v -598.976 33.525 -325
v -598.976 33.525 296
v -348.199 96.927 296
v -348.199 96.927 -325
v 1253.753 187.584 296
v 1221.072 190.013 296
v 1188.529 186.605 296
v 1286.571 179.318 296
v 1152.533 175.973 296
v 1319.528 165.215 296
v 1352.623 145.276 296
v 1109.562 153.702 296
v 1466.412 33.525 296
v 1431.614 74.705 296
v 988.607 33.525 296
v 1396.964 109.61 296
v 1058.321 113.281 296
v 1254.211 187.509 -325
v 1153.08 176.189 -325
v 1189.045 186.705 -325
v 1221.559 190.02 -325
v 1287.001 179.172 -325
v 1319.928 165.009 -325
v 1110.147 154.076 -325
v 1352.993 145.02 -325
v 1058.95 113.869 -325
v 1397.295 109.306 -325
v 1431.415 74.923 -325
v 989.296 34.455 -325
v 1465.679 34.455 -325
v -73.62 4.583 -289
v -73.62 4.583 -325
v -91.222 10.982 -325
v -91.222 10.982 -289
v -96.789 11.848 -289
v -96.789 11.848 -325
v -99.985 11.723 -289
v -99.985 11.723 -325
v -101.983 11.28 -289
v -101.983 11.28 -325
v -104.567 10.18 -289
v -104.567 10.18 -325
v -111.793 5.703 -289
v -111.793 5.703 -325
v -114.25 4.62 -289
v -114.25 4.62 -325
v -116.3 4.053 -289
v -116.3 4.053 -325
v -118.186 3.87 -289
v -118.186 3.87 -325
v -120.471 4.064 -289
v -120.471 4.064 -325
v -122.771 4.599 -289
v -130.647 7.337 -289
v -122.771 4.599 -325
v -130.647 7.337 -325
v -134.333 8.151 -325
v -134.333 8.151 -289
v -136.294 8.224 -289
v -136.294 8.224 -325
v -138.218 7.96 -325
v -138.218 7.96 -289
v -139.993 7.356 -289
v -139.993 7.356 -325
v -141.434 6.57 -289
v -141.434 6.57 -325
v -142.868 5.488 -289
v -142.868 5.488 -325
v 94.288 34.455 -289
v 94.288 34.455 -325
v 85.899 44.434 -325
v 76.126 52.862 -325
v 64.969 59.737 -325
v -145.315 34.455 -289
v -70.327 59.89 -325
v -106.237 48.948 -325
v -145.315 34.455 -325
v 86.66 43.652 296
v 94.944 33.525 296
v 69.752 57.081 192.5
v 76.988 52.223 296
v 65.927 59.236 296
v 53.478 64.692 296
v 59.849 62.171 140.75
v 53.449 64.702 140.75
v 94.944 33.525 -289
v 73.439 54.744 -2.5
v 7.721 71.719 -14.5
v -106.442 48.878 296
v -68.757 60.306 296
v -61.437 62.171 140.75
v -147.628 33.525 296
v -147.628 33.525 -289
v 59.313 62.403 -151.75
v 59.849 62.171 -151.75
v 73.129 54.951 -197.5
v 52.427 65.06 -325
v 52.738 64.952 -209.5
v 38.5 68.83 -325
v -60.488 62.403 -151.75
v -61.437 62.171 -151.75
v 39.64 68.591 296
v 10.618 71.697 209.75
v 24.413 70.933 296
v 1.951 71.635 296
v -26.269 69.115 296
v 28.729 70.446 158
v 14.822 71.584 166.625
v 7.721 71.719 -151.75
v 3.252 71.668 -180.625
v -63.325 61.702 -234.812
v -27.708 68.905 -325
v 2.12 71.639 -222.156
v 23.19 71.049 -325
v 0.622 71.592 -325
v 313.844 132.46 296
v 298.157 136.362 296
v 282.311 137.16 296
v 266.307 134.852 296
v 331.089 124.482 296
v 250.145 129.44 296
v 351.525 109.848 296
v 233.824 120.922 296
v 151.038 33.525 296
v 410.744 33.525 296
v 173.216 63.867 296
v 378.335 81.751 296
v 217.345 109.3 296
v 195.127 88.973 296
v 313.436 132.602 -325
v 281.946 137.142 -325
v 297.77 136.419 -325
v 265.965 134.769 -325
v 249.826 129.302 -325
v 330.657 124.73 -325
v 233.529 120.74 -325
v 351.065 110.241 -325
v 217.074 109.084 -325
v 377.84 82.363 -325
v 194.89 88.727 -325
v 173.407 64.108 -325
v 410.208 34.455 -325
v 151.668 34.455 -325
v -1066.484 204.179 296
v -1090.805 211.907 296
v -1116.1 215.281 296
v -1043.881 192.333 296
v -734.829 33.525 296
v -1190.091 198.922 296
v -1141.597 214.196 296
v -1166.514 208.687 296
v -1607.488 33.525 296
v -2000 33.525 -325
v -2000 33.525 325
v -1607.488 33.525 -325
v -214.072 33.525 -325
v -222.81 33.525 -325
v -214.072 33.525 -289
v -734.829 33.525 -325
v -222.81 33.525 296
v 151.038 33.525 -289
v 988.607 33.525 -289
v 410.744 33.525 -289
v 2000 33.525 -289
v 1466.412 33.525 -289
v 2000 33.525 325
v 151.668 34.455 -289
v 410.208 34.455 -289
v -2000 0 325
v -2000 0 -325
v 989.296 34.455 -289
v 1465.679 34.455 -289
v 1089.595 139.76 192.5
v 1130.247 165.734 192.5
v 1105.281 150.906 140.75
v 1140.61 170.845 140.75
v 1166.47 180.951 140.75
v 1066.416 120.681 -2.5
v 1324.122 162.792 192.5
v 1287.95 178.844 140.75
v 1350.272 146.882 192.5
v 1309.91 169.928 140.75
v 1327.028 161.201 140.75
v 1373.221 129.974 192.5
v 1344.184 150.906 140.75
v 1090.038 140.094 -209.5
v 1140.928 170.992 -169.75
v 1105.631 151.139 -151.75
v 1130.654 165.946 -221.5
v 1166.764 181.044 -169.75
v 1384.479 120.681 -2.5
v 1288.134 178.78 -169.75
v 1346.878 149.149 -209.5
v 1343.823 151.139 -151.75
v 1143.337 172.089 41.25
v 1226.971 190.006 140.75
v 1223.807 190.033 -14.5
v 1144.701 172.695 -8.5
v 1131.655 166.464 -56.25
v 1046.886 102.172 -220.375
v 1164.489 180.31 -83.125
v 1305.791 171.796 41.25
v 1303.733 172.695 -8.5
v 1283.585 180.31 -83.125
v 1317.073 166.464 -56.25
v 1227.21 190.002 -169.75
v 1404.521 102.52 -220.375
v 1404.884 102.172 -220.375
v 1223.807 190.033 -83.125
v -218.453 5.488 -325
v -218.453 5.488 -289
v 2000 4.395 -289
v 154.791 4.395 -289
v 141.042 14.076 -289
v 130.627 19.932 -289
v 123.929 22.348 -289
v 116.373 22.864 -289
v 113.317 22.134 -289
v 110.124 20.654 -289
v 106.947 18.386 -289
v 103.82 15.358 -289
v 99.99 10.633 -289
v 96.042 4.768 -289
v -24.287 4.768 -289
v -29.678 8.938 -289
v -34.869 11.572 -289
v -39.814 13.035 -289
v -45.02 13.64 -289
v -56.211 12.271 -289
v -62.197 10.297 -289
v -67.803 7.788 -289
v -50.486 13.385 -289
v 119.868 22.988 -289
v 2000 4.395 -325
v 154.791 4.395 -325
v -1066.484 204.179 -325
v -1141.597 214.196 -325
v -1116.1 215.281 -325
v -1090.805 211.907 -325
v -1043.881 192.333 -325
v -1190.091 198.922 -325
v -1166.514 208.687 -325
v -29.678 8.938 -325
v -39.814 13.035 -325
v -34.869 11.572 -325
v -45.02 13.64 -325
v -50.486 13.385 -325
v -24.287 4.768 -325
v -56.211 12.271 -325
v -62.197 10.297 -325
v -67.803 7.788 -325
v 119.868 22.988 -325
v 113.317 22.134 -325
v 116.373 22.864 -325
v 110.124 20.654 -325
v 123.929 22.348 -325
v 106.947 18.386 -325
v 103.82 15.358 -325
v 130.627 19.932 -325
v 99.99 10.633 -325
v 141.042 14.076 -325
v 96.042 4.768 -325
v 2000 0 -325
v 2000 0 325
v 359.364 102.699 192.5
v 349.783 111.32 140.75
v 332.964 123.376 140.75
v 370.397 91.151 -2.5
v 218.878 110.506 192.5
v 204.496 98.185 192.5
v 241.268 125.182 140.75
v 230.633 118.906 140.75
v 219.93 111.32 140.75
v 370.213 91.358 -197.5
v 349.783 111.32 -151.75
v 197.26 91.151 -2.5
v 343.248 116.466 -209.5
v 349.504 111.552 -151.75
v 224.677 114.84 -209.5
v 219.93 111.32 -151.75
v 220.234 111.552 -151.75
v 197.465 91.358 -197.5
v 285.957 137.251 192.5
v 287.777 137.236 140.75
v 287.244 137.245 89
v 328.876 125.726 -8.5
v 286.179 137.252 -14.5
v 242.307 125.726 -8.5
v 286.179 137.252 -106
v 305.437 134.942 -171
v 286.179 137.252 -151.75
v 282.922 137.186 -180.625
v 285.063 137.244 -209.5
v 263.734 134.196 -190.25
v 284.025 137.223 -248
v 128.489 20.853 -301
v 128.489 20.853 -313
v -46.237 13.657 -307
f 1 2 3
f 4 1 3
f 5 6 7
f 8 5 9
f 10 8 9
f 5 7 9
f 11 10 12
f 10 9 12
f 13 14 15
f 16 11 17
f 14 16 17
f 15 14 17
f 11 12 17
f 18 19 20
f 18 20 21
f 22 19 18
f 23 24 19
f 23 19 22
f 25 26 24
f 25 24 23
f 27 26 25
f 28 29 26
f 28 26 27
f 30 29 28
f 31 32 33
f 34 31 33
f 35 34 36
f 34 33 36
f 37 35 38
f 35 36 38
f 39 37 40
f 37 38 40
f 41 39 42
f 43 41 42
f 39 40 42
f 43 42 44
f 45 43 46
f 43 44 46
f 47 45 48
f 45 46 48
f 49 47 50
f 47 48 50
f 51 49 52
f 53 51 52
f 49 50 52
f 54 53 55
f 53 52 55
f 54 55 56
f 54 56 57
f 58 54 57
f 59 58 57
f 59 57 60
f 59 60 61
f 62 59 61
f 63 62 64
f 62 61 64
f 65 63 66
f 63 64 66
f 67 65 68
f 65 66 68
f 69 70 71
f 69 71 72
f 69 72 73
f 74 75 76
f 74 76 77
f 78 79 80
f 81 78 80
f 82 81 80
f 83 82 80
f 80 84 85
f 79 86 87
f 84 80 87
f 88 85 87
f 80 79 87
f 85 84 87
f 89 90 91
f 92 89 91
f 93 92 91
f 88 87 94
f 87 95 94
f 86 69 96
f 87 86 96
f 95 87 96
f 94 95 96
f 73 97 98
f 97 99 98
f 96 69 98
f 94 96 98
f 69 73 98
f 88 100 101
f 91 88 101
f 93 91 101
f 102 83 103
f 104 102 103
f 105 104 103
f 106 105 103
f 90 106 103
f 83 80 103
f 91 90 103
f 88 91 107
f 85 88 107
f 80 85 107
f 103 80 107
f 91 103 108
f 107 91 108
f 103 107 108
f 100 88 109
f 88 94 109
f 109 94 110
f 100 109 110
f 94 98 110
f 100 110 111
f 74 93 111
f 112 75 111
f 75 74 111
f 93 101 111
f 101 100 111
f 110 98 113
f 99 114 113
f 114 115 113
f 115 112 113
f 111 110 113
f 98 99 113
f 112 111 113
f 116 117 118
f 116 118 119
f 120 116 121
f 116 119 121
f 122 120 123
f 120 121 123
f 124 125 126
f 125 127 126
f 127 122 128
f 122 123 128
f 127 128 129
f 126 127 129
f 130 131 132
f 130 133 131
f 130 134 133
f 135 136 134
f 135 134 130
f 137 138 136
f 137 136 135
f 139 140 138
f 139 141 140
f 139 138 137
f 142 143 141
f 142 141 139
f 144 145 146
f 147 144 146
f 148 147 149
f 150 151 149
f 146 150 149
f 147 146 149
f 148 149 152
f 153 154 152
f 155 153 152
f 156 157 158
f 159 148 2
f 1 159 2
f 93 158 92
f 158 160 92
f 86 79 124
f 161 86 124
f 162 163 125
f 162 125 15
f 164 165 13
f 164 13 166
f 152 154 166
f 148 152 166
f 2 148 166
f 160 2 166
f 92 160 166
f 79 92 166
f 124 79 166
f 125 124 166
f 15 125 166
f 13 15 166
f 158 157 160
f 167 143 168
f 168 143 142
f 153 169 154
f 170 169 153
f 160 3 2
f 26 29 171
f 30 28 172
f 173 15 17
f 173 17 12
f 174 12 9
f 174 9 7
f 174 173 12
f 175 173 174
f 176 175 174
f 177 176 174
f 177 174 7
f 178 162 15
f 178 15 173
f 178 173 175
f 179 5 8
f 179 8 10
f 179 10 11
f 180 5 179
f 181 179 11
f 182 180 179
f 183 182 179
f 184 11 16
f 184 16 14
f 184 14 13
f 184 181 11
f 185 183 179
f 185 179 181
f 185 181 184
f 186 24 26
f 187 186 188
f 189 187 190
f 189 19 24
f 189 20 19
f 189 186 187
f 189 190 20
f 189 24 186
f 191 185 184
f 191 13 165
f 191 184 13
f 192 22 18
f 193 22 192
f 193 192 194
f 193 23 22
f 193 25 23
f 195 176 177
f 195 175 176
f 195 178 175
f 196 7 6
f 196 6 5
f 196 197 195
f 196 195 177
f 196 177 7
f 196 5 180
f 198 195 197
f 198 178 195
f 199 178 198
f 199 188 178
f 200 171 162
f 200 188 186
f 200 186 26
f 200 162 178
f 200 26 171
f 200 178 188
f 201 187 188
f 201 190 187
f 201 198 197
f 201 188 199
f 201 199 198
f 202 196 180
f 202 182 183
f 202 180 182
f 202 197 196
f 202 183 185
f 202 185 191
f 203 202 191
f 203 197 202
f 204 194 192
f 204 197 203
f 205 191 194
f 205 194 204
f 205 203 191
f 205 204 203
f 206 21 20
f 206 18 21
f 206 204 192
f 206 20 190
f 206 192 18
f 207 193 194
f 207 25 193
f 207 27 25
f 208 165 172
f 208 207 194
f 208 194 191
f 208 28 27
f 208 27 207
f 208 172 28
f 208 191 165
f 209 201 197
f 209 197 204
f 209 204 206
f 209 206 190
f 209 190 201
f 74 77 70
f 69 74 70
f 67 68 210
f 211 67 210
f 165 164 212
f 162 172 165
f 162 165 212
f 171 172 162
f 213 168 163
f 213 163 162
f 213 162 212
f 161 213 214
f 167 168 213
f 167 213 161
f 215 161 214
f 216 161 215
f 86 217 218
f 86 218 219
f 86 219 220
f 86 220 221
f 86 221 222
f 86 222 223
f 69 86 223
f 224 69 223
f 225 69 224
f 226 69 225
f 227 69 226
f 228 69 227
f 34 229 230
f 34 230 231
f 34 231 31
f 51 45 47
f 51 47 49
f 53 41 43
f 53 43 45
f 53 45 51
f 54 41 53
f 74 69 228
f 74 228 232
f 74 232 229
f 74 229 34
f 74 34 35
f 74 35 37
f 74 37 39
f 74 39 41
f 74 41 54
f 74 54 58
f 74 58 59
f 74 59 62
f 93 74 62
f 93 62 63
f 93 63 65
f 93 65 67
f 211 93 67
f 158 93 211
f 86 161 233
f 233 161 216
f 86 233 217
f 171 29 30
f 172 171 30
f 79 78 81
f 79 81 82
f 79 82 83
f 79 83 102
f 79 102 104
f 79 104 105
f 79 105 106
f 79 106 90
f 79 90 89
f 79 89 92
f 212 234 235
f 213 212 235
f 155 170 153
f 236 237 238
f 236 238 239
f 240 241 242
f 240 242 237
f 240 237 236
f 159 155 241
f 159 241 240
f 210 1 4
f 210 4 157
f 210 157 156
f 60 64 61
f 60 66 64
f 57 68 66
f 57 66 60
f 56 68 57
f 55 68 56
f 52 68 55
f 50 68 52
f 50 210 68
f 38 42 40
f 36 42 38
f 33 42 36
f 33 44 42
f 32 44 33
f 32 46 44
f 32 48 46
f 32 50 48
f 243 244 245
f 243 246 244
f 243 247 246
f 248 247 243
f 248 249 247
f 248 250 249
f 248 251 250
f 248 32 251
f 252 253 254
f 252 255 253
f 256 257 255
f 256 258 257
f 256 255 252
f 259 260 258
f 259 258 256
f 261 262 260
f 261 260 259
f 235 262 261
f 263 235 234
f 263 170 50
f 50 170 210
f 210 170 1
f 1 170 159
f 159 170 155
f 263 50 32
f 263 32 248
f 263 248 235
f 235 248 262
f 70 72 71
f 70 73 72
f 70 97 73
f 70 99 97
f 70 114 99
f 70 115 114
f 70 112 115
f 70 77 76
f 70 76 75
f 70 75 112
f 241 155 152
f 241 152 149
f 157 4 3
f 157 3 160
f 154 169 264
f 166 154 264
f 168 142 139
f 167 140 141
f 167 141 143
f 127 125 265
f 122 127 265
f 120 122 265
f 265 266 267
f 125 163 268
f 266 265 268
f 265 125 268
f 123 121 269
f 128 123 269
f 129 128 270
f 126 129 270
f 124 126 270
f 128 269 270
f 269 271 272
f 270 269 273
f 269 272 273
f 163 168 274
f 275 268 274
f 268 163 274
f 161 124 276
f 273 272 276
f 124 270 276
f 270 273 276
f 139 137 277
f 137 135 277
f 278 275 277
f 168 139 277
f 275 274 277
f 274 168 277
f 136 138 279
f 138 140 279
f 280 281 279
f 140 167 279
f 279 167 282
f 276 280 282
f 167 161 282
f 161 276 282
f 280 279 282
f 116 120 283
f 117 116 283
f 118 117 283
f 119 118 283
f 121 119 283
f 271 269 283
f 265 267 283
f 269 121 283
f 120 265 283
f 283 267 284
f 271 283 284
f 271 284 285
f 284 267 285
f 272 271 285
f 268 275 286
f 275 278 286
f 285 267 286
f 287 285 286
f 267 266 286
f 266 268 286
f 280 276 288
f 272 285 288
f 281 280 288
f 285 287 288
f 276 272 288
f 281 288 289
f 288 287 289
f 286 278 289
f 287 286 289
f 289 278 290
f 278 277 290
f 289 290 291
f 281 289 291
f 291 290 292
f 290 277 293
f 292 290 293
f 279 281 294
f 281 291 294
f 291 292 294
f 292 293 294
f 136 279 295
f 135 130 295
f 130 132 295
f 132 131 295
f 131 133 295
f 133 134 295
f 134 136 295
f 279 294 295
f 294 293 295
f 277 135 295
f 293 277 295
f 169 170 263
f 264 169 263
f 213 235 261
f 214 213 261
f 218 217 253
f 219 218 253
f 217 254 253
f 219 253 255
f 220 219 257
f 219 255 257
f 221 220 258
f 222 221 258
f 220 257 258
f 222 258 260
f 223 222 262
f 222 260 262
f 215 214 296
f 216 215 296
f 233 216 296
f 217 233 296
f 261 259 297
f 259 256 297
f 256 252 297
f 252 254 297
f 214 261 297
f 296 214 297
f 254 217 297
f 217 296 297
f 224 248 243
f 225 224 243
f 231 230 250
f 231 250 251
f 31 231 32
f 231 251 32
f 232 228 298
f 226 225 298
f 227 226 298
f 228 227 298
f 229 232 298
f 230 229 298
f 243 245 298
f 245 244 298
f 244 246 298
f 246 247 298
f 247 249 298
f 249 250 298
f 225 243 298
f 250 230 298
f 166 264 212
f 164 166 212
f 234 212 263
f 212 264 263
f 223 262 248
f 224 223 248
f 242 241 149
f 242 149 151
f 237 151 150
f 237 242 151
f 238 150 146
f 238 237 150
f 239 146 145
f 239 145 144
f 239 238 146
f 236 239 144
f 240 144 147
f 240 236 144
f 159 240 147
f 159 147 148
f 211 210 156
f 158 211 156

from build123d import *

# Parameters (mm, degrees)
SKETCH1_W           = 4000
SKETCH1_H           = 650
BOSS_EXTRUDE1_DEPTH = 300
CUT_EXTRUDE3_DEPTH  = 333
CUT_EXTRUDE4_DEPTH  = 333
SKETCH7_W           = 4176.612748617
SKETCH7_H           = 878.539936904
CUT_EXTRUDE5_DEPTH  = 1765
BOSS_EXTRUDE2_DEPTH = 621
CUT_EXTRUDE2_DEPTH  = 36
SKETCH9_W           = 176.354899095
SKETCH9_H           = 70.962636727
CUT_EXTRUDE6_DEPTH  = 1243


with BuildPart() as part:
    # Sketch1 → Boss-Extrude1 (new body)
    with BuildSketch(Plane(origin=(0, 0, 0), x_dir=(1, 0, 0), z_dir=(0, 1, 0))):
        Rectangle(SKETCH1_W, SKETCH1_H)
    extrude(amount=BOSS_EXTRUDE1_DEPTH)

    # Sketch4 → Cut-Extrude3 (cut)
    with BuildSketch(Plane.XY.offset(325)):
        with BuildLine():
            Line((-2000, 42), (-1023.920441049, 42))
            add(Edge.make_bspline(
                [(-1023.920441049, 42), (-625.596073389, 421.290119466), (-564.500559645, 42), (-394.069004627, 42)],
                knots=[0, 0, 0, 0, 1, 1, 1, 1], degree=3))
            Line((-394.069004627, 42), (77.281429251, 42))
            add(Edge.make_bspline(
                [(77.281429251, 42), (384.820845821, 379.875880114), (804.142903292, 42.162527318)],
                knots=[0, 0, 0, 1, 1, 1], degree=2))
            add(Edge.make_bspline(
                [(804.142903292, 42.162527318), (1120.560926985, 359.520052232), (1155.923131209, 42), (1331.813245168, 42)],
                knots=[0, 0, 0, 0, 1, 1, 1, 1], degree=3))
            Line((1331.813245168, 42), (2000, 42))
            Line((2000, 42), (2000, 300))
            Line((2000, 300), (-2000, 300))
            Line((-2000, 300), (-2000, 42))
        make_face()
    extrude(amount=-CUT_EXTRUDE3_DEPTH, mode=Mode.SUBTRACT)

    # Sketch6 → Cut-Extrude4 (cut)
    with BuildSketch(Plane(origin=(0, 0, -325), x_dir=(-1, 0, 0), z_dir=(0, 0, -1))):
        with BuildLine():
            Line((-2000, 42), (-1446.05727282, 42))
            add(Edge.make_bspline(
                [(-1446.05727282, 42), (-1028.485172915, 427.490568143), (-723.10412717, 43.749887322)],
                knots=[0, 0, 0, 1, 1, 1], degree=2))
            Line((-723.10412717, 43.749887322), (89.99607078, 43.749887322))
            add(Edge.make_bspline(
                [(89.99607078, 43.749887322), (269.67433471, 358.502210653), (843.089835557, 43.749887322)],
                knots=[0, 0, 0, 1, 1, 1], degree=2))
            add(Edge.make_bspline(
                [(843.089835557, 43.749887322), (1192.189018248, 462.039061907), (1476.297158589, 43.749887322)],
                knots=[0, 0, 0, 1, 1, 1], degree=2))
            Line((1476.297158589, 43.749887322), (2000, 42))
            Line((2000, 42), (2000, 300))
            Line((2000, 300), (-2000, 300))
            Line((-2000, 300), (-2000, 42))
        make_face()
    extrude(amount=-CUT_EXTRUDE4_DEPTH, mode=Mode.SUBTRACT)

    # Sketch7 → Cut-Extrude5 (cut)
    with BuildSketch(Plane.XY.offset(325)):
        with Locations((88.306374309, 472.795361716)):
            Rectangle(SKETCH7_W, SKETCH7_H)
    extrude(amount=-CUT_EXTRUDE5_DEPTH, mode=Mode.SUBTRACT)

    # Sketch8 → Boss-Extrude2 (add)
    with BuildSketch(Plane(origin=(0, 0, -325), x_dir=(-1, 0, 0), z_dir=(0, 0, -1))):
        with BuildLine():
            Line((-1466.411502922, 33.525393264), (-988.607191526, 33.525393264))
            add(Edge.make_bspline(
                [(-988.607191526, 33.525393264), (-1220.104325428, 346.541530652), (-1466.411502922, 33.525393264)],
                knots=[0, 0, 0, 1, 1, 1], degree=2))
        make_face()
        with BuildLine():
            Line((-410.743928037, 33.525393264), (-151.038080393, 33.525393264))
            add(Edge.make_bspline(
                [(-410.743928037, 33.525393264), (-291.466535424, 240.977763656), (-151.038080393, 33.525393264)],
                knots=[0, 0, 0, 1, 1, 1], degree=2))
        make_face()
        with BuildLine():
            Line((-615.129598905, 33.525393264), (-449.639529972, 33.525393264))
            add(Edge.make_bspline(
                [(-615.129598905, 33.525393264), (-519.506305291, 140.143472245), (-449.639529972, 33.525393264)],
                knots=[0, 0, 0, 1, 1, 1], degree=2))
        make_face()
        with BuildLine():
            Line((-94.943921992, 33.525393264), (147.62807094, 33.525393264))
            add(Edge.make_bspline(
                [(-94.943921992, 33.525393264), (-41.784880201, 109.912399552), (147.62807094, 33.525393264)],
                knots=[0, 0, 0, 1, 1, 1], degree=2))
        make_face()
        Polygon((348.198866267, 96.926617606), (222.810217102, 33.525393264), (598.976164599, 33.525393264), align=None)
        with BuildLine():
            Line((1043.880942781, 192.333296754), (734.829470359, 33.525393264))
            Line((734.829470359, 33.525393264), (1607.487691917, 33.525393264))
            Line((1607.487691917, 33.525393264), (1190.091100426, 198.921972194))
            ThreePointArc((1190.091100426, 198.921972194), (1116.100399875, 215.280581972), (1043.880942781, 192.333296754))
        make_face()
    extrude(amount=-BOSS_EXTRUDE2_DEPTH)

    # Sketch3 → Cut-Extrude2 (cut)
    with BuildSketch(Plane(origin=(0, 0, -325), x_dir=(-1, 0, 0), z_dir=(0, 0, -1))):
        with BuildLine():
            Line((-2000, 4.395124569), (-154.790798, 4.395124569))
            add(Edge.make_bspline(
                [(-154.790798, 4.395124569), (-122.121165819, 28.84941573), (-111.562876496, 29.486117766), (-96.041953686, 4.767611069)],
                knots=[0, 0, 0, 0, 1, 1, 1, 1], degree=3))
            Line((-96.041953686, 4.767611069), (24.286817383, 4.767611069))
            add(Edge.make_bspline(
                [(24.286817383, 4.767611069), (43.520377225, 22.639006885), (73.620382864, 4.582969303)],
                knots=[0, 0, 0, 1, 1, 1], degree=2))
            add(Edge.make_bspline(
                [(73.620382864, 4.582969303), (101.904065398, 17.027789618), (102.645412237, 9.528187349), (123.323430354, 0.559894652), (134.386420176, 12.839234646), (142.868415145, 5.48817234)],
                knots=[0, 0, 0, 0, 0.498478211, 0.598478211, 1, 1, 1, 1], degree=3))
            Line((142.868415145, 5.48817234), (218.45286868, 5.48817234))
            Line((218.45286868, 5.48817234), (213.926853499, 34.454669503))
            Line((213.926853499, 34.454669503), (-2000, 34.454669503))
            Line((-2000, 34.454669503), (-2000, 4.395124569))
        make_face()
    extrude(amount=-CUT_EXTRUDE2_DEPTH, mode=Mode.SUBTRACT)

    # Sketch9 → Cut-Extrude6 (cut)
    with BuildSketch(Plane(origin=(0, 0, -325), x_dir=(-1, 0, 0), z_dir=(0, 0, -1))):
        with Locations((-526.952149358, 69.006711628)):
            Rectangle(SKETCH9_W, SKETCH9_H)
    extrude(amount=-CUT_EXTRUDE6_DEPTH, mode=Mode.SUBTRACT)


solid = part.part
